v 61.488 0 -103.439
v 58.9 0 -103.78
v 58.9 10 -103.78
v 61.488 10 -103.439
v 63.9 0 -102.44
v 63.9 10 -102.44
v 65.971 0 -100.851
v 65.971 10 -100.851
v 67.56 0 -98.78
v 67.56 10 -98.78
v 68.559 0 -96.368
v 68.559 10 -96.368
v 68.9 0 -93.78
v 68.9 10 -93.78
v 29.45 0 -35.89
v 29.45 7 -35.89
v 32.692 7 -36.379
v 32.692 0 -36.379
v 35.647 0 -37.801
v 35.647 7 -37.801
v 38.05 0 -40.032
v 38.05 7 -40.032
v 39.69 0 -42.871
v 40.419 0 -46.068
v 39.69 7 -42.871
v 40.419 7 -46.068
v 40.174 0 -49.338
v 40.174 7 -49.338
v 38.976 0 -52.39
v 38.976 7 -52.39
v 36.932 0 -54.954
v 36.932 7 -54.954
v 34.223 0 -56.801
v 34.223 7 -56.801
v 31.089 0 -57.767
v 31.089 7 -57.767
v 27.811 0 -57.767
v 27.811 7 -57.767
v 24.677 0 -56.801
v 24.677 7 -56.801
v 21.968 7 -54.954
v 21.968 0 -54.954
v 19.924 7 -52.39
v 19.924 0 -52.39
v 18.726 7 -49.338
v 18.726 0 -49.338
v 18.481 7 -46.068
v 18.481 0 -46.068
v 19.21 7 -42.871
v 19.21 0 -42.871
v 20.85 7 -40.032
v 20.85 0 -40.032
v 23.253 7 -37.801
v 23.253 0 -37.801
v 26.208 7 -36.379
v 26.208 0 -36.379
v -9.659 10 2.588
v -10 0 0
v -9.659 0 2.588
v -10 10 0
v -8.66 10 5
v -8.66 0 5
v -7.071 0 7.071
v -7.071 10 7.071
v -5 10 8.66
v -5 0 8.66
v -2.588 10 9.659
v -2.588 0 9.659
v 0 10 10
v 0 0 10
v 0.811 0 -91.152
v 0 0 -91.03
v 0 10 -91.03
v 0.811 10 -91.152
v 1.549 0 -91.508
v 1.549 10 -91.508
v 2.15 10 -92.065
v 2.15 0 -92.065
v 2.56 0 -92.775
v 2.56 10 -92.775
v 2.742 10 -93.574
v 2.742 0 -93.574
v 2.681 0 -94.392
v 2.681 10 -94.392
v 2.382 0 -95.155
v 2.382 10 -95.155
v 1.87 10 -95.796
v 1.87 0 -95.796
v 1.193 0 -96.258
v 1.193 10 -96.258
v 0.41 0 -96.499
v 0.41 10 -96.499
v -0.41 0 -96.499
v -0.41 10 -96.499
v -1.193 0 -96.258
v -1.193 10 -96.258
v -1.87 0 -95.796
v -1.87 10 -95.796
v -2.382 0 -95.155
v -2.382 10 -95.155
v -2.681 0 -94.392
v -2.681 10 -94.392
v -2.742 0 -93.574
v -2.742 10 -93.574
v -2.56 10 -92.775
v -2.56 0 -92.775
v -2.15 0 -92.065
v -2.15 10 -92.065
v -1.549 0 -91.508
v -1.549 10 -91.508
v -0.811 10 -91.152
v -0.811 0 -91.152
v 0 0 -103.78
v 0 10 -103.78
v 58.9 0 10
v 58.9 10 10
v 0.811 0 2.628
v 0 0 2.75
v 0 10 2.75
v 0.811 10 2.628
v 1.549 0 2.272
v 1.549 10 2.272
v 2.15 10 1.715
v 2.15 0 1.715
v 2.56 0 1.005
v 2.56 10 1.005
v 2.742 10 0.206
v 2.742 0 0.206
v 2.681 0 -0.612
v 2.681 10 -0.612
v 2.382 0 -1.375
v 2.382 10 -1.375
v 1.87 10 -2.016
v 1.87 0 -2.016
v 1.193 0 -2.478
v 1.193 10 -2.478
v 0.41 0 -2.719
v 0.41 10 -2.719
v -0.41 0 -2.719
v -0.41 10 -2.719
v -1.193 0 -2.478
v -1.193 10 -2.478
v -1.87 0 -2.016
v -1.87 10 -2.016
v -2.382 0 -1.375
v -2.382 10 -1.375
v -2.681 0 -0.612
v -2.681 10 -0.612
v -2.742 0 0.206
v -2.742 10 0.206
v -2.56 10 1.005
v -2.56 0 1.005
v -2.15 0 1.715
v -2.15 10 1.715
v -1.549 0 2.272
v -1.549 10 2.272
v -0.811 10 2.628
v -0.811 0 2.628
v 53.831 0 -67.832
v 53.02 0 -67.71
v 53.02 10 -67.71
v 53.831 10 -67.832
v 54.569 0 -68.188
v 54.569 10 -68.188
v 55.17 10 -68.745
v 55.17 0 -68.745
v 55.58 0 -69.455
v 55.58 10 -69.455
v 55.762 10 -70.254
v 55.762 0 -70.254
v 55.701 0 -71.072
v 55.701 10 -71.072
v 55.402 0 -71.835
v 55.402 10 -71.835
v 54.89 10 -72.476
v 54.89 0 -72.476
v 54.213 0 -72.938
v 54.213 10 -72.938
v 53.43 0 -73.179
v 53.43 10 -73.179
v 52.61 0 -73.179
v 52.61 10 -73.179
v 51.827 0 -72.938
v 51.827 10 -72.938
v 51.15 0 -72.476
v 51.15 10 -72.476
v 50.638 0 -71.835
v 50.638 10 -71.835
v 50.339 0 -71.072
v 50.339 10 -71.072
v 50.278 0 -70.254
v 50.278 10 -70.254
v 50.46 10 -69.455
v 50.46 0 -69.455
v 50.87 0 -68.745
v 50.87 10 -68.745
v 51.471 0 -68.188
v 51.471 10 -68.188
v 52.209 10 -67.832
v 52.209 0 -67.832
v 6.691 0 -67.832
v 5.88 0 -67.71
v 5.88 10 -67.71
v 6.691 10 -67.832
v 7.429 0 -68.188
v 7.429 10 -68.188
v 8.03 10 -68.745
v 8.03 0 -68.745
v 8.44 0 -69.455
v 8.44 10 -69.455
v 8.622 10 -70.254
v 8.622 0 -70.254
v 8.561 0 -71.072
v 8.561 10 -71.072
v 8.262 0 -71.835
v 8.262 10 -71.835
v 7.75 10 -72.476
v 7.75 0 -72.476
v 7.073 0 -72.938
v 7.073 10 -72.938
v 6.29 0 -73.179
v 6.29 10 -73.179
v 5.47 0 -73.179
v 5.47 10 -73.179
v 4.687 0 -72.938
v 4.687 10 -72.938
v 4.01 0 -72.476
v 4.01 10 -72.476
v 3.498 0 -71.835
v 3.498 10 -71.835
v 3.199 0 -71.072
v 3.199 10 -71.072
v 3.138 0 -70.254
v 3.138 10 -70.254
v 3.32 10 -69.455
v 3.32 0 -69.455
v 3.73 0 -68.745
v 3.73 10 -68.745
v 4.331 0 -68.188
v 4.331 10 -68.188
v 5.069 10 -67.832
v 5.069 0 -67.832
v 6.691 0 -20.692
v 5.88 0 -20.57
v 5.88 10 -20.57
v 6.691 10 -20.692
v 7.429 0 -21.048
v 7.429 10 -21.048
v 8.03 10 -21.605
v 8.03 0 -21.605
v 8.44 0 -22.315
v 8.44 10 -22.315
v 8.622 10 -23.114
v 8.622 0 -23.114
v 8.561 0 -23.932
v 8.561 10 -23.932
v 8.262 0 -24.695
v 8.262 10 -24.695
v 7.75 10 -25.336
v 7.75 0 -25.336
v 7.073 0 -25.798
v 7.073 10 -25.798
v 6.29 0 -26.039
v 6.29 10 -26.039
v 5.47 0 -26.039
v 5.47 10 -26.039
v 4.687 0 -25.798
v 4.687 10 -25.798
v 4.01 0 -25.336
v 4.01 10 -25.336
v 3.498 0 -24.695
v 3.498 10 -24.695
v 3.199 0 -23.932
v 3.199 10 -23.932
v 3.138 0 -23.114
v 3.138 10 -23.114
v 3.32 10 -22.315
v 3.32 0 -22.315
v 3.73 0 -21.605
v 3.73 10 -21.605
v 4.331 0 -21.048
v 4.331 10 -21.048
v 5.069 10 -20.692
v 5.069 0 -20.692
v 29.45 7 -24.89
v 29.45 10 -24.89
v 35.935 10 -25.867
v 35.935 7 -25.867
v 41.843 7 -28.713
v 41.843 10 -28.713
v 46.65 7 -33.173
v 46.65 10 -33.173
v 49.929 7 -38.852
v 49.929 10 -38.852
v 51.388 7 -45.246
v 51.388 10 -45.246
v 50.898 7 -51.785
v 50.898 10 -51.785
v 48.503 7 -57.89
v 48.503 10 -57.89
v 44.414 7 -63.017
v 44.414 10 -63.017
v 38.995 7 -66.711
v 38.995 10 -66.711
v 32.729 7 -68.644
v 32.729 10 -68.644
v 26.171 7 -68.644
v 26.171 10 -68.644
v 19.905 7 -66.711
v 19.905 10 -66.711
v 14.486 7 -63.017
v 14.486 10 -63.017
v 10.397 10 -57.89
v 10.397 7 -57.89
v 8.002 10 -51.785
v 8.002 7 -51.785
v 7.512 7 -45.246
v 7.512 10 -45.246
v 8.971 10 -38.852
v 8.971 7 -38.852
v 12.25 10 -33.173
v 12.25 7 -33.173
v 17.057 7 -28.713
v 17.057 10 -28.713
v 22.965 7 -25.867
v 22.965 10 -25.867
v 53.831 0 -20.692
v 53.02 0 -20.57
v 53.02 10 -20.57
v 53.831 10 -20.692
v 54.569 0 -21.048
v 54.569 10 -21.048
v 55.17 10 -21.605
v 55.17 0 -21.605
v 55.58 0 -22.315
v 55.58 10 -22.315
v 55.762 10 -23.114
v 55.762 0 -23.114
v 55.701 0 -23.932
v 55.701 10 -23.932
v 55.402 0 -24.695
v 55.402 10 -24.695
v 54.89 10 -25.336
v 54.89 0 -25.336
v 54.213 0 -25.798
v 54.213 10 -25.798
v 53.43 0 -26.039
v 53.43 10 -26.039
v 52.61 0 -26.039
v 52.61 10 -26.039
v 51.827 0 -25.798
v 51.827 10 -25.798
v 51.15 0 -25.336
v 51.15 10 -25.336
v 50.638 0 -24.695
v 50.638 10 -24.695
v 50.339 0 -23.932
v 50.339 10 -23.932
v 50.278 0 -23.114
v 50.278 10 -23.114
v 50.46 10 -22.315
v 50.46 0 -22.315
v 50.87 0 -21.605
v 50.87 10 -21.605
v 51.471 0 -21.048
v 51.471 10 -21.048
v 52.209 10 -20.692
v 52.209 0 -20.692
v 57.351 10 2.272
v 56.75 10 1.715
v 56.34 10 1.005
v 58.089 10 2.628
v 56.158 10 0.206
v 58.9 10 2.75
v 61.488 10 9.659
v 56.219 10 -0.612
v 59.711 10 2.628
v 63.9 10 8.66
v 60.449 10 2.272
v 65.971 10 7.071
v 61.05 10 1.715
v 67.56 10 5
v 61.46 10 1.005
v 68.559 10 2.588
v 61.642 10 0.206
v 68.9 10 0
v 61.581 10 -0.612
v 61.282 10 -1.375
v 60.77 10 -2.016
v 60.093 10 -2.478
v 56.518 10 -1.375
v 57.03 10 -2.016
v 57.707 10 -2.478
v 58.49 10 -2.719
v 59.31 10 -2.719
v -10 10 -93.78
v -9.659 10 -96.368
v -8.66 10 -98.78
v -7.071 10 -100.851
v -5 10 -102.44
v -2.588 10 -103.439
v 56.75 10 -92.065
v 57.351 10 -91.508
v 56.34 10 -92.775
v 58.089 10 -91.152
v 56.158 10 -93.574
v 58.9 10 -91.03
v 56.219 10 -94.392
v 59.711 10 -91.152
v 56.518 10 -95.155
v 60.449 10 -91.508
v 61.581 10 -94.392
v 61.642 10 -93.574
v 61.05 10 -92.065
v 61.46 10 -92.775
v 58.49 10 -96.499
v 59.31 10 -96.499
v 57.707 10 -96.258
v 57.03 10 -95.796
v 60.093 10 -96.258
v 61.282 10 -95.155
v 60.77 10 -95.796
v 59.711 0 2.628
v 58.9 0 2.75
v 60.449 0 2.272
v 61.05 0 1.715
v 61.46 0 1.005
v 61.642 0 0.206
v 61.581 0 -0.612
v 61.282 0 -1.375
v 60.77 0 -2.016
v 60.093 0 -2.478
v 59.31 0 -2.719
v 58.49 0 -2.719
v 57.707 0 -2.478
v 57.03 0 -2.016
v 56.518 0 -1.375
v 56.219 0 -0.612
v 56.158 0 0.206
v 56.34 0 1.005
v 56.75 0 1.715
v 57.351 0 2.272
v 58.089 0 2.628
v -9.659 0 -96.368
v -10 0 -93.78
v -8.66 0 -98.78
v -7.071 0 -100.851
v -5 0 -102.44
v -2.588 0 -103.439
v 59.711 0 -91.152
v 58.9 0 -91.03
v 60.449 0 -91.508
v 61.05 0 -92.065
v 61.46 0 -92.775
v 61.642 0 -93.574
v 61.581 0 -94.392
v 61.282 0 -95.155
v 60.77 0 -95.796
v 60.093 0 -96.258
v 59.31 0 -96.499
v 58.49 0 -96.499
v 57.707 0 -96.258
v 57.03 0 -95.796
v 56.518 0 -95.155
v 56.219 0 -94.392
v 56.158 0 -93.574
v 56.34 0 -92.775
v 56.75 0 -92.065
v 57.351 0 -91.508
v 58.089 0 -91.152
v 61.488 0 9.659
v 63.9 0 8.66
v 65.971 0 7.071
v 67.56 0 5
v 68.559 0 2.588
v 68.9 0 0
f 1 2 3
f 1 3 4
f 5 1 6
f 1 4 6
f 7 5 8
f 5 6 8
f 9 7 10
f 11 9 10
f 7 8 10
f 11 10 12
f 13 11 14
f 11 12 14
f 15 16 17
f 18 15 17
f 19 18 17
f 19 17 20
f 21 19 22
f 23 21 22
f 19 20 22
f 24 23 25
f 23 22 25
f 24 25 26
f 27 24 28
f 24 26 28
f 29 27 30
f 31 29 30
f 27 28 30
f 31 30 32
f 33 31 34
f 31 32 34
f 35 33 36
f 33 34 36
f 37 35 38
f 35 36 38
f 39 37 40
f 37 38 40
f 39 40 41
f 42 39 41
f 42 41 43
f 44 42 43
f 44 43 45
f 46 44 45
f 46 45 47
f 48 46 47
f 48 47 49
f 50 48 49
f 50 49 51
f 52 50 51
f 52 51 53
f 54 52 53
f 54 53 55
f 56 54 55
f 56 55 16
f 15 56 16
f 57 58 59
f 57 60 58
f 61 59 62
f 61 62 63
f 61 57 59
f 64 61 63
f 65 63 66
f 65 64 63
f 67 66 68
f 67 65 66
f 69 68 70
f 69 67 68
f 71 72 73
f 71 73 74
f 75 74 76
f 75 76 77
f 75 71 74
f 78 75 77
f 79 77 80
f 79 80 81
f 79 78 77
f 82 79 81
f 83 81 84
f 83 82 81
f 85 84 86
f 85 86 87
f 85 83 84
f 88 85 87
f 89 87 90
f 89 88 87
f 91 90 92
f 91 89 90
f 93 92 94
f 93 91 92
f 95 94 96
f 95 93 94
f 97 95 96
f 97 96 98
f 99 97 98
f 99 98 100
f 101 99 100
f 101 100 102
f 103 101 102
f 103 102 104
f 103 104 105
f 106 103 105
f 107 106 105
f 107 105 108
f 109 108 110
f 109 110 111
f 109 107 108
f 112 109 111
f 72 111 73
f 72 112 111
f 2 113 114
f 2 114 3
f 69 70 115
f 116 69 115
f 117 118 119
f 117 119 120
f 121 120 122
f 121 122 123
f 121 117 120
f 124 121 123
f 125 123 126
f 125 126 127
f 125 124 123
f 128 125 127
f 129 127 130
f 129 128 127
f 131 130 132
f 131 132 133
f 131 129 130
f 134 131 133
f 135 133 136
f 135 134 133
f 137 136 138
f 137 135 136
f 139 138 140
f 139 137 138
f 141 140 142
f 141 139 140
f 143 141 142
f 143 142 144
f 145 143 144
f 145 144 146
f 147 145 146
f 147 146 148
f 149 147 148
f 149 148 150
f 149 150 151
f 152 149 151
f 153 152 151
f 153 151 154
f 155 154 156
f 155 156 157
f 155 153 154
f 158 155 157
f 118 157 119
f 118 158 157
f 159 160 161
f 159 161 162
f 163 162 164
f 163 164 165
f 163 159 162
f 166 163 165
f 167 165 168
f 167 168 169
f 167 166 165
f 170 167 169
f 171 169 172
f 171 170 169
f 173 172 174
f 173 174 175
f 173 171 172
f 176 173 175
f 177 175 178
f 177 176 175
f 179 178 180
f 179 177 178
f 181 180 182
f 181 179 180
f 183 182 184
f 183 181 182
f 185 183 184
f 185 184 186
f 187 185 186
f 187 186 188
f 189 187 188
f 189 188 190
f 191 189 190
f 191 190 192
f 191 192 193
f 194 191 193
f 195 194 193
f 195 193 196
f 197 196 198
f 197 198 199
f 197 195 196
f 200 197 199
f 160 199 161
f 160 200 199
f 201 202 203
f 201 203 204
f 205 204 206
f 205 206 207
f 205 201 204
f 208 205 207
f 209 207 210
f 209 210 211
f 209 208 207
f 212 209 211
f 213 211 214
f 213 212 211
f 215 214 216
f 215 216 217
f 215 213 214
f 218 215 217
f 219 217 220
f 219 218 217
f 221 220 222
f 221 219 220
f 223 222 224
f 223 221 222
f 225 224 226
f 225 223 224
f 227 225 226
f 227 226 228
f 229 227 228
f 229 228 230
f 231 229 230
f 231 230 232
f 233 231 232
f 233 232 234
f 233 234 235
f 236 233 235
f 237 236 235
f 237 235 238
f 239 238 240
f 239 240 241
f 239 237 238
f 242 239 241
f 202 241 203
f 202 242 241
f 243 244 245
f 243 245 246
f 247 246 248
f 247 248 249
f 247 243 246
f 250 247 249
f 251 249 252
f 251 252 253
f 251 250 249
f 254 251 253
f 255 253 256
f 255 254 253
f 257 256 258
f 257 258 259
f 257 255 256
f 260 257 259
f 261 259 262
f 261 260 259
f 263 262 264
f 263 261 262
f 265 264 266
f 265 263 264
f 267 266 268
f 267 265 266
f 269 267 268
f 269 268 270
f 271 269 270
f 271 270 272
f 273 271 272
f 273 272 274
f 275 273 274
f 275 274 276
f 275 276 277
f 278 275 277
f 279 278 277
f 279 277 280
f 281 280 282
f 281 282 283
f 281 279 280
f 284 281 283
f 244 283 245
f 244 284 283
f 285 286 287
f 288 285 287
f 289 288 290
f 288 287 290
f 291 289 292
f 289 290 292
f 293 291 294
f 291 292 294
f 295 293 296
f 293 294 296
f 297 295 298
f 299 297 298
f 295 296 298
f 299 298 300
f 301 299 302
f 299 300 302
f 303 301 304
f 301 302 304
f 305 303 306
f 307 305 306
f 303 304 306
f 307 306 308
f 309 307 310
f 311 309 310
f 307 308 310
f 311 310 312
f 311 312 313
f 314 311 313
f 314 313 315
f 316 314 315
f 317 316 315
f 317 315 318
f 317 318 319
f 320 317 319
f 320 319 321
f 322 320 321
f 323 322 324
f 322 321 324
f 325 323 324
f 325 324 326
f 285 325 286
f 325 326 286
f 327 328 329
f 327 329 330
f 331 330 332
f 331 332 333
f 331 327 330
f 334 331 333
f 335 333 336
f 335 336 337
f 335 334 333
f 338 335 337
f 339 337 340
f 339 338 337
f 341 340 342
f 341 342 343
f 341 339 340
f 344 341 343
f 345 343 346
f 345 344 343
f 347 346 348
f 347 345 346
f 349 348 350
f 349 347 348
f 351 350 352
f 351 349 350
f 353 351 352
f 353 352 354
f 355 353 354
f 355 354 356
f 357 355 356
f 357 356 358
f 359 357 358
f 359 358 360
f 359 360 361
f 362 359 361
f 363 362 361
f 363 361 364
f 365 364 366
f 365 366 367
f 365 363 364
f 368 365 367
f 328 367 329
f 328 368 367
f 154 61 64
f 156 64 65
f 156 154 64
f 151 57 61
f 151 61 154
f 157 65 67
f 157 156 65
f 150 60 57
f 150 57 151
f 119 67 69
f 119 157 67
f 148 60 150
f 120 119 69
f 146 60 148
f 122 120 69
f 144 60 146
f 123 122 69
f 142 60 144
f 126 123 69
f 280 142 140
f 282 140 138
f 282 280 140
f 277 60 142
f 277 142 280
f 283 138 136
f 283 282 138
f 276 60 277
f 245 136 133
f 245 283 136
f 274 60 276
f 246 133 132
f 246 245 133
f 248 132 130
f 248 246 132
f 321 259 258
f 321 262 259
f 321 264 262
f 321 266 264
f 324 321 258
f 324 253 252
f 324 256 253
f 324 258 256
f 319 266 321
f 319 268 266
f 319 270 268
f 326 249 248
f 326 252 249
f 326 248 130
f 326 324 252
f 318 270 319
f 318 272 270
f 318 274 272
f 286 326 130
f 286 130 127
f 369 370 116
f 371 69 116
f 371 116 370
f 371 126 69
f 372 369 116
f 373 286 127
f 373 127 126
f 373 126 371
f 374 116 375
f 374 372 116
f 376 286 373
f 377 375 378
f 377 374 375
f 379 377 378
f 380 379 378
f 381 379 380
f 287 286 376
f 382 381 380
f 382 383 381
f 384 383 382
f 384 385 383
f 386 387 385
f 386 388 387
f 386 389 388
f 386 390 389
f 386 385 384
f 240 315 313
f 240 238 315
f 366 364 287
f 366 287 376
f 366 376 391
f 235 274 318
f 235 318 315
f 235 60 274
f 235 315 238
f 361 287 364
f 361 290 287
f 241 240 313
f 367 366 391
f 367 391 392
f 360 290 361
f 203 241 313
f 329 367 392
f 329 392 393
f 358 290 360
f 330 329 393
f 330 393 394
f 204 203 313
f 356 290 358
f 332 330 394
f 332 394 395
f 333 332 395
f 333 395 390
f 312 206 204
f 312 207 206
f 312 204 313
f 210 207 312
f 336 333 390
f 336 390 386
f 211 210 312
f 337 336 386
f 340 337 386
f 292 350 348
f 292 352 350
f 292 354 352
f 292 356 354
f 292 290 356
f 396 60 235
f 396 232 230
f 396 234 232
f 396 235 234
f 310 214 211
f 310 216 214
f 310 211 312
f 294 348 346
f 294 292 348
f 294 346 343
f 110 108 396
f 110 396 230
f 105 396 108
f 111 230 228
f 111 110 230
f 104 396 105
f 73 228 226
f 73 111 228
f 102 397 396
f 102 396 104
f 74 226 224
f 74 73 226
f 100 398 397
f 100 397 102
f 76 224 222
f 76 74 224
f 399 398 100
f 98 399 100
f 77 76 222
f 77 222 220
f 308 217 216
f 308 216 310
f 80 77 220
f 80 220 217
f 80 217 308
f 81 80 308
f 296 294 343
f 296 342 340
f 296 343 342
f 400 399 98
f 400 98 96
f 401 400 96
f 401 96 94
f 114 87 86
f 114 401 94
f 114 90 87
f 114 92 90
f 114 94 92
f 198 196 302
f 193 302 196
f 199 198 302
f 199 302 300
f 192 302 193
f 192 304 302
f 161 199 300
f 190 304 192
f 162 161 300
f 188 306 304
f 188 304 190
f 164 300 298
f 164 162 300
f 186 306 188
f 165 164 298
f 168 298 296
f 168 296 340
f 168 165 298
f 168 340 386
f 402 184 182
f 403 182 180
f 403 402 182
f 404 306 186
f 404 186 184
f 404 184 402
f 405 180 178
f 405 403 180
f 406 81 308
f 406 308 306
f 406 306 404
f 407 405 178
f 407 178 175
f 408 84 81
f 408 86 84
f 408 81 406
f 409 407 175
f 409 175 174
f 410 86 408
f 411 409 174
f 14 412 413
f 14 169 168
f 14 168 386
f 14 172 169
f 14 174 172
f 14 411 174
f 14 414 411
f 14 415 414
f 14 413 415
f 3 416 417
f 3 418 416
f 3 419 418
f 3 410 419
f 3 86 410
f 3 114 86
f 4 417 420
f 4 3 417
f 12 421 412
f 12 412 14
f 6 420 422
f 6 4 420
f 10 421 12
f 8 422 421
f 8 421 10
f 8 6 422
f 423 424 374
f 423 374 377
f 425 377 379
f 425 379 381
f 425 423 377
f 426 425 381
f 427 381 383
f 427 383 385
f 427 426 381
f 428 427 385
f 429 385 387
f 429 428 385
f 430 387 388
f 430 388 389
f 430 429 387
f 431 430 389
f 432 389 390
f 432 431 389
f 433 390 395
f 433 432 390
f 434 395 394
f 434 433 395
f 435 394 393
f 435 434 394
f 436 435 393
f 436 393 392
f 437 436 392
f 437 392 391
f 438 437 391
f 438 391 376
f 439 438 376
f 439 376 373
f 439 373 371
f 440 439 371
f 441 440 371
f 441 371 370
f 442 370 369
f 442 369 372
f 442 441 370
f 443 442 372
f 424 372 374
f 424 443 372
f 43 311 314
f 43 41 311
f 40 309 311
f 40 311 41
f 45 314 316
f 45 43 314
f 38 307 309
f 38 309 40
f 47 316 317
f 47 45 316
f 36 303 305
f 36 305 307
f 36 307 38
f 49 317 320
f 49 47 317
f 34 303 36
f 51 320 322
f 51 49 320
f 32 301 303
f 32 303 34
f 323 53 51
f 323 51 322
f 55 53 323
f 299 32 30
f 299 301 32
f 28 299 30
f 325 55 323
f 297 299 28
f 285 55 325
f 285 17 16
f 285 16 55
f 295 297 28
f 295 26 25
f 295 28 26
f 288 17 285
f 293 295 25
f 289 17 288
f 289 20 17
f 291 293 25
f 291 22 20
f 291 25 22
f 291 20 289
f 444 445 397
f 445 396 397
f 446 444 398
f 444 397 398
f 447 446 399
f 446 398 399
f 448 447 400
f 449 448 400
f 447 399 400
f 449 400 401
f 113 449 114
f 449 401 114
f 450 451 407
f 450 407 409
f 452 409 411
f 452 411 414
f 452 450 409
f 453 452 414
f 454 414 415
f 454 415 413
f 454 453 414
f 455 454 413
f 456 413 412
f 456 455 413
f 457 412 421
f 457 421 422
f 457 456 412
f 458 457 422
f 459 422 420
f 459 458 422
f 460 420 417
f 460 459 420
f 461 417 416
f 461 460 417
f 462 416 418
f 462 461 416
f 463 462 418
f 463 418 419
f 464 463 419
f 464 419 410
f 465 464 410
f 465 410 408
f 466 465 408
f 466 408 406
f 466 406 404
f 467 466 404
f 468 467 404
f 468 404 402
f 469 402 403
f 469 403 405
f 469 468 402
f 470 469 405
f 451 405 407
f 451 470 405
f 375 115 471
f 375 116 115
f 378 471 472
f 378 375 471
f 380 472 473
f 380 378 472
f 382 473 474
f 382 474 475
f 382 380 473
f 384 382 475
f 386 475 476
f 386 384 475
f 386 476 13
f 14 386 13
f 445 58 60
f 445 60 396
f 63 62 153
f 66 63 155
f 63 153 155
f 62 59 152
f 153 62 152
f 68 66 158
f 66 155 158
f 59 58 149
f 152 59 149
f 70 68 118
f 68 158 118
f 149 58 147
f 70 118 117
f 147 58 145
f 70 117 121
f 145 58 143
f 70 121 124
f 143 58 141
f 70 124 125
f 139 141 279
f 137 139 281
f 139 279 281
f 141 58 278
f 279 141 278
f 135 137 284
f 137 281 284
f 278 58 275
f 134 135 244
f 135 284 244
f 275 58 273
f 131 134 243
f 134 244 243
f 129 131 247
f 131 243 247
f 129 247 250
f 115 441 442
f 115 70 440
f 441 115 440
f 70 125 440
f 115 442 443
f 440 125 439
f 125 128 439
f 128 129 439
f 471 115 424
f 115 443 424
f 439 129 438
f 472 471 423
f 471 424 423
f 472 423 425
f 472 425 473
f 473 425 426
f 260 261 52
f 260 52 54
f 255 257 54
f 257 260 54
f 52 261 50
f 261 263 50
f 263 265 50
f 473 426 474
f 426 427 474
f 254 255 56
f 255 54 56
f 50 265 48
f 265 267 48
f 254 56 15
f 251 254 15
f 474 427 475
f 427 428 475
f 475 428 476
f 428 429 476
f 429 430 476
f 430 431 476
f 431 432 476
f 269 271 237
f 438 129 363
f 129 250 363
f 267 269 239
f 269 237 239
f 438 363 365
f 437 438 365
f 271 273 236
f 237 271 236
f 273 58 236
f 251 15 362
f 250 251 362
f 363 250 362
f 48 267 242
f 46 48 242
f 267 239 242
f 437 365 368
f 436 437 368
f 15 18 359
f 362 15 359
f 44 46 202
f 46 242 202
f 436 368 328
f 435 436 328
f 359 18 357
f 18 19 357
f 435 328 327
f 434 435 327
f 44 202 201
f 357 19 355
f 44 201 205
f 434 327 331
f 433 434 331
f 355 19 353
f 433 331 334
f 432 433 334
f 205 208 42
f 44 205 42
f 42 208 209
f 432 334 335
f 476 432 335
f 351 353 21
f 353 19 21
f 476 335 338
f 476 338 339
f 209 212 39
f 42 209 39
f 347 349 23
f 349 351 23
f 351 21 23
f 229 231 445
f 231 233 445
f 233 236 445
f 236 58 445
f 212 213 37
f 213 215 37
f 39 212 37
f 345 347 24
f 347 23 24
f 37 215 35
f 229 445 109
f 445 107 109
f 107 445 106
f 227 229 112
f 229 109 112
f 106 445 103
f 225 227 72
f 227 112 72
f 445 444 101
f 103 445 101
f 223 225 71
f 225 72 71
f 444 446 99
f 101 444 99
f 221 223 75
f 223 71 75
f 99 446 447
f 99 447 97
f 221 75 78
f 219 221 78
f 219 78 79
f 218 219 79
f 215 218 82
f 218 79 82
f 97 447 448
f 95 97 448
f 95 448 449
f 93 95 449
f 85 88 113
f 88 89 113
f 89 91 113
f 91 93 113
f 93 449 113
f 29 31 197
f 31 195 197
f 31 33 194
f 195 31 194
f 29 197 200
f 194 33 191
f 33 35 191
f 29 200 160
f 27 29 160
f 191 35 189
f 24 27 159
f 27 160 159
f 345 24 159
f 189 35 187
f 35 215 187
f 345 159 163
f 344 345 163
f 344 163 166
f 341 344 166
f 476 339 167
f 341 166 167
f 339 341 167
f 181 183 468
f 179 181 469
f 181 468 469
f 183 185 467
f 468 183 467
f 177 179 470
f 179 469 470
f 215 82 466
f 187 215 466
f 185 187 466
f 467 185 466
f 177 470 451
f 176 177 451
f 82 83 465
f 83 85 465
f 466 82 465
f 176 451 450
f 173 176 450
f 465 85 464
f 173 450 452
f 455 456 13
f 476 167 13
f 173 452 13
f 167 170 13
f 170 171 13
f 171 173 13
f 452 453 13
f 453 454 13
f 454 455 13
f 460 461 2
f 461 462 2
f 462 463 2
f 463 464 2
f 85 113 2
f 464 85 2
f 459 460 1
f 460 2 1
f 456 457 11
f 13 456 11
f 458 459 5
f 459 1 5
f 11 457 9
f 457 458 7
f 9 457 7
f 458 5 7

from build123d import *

# Parameters (mm, degrees)
SKETCH1_W           = 78.9
SKETCH1_H           = 113.78
SKETCH1_R           = 2.75
BOSS_EXTRUDE1_DEPTH = 10
SKETCH2_R           = 11
CUT_EXTRUDE1_DEPTH  = 10
SKETCH3_R           = 22
CUT_EXTRUDE2_DEPTH  = 3
FILLET1_R           = 10


with BuildPart() as part:
    # Sketch1 → Boss-Extrude1 (new body)
    with BuildSketch(Plane(origin=(0, 0, 0), x_dir=(1, 0, 0), z_dir=(0, 1, 0))):
        with Locations((29.45, 46.89)):
            Rectangle(SKETCH1_W, SKETCH1_H)
        with Locations(Location((0, 93.78, 0), (0, 0, 270))):
            Circle(SKETCH1_R, mode=Mode.SUBTRACT)
        with Locations(Location((58.9, 93.78, 0), (0, 0, 270))):
            Circle(SKETCH1_R, mode=Mode.SUBTRACT)
        with Locations(Location((58.9, 0, 0), (0, 0, 270))):
            Circle(SKETCH1_R, mode=Mode.SUBTRACT)
        with Locations(Location((0, 0, 0), (0, 0, 270))):
            Circle(SKETCH1_R, mode=Mode.SUBTRACT)
        with Locations(Location((5.88, 70.46, 0), (0, 0, 270))):
            Circle(SKETCH1_R, mode=Mode.SUBTRACT)
        with Locations(Location((53.02, 70.46, 0), (0, 0, 270))):
            Circle(SKETCH1_R, mode=Mode.SUBTRACT)
        with Locations(Location((53.02, 23.32, 0), (0, 0, 270))):
            Circle(SKETCH1_R, mode=Mode.SUBTRACT)
        with Locations(Location((5.88, 23.32, 0), (0, 0, 270))):
            Circle(SKETCH1_R, mode=Mode.SUBTRACT)
    extrude(amount=BOSS_EXTRUDE1_DEPTH)

    # Sketch2 → Cut-Extrude1 (cut)
    with BuildSketch(Plane(origin=(0, 10, 0), x_dir=(1, 0, 0), z_dir=(0, 1, 0))):
        with Locations(Location((29.45, 46.89, 0), (0, 0, 270))):
            Circle(SKETCH2_R)
    extrude(amount=-CUT_EXTRUDE1_DEPTH, mode=Mode.SUBTRACT)

    # Sketch3 → Cut-Extrude2 (cut)
    with BuildSketch(Plane(origin=(0, 10, 0), x_dir=(1, 0, 0), z_dir=(0, 1, 0))):
        with Locations(Location((29.45, 46.89, 0), (0, 0, 270))):
            Circle(SKETCH3_R)
    extrude(amount=-CUT_EXTRUDE2_DEPTH, mode=Mode.SUBTRACT)

    # Fillet1
    fillet1_edges = [part.edges().sort_by_distance(p)[0] for p in [
        (-10, 5, 10),
        (-10, 5, -103.78),
        (68.9, 5, -103.78),
        (68.9, 5, 10),
    ]]
    fillet(fillet1_edges, radius=FILLET1_R)


solid = part.part
